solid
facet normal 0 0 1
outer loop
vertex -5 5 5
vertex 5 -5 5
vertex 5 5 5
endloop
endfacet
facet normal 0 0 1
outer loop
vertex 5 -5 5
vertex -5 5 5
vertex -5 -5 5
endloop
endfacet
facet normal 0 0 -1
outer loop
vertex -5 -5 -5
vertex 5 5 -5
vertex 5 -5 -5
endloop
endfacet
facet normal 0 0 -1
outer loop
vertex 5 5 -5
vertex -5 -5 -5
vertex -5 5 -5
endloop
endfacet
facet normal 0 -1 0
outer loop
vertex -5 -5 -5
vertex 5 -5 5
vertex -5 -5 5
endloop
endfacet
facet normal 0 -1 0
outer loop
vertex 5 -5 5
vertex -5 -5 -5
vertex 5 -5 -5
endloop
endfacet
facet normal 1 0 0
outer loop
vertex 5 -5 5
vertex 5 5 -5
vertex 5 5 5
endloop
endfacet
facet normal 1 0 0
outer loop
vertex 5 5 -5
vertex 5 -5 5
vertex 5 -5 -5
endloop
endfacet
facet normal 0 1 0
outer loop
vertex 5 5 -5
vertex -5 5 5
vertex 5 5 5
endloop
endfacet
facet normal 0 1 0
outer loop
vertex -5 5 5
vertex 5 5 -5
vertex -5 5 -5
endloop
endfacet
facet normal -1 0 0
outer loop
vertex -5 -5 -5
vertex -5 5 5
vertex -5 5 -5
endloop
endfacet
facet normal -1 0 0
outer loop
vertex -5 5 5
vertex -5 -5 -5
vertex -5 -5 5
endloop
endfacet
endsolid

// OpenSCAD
box_l = 10;	// Length
box_w = 10;	// Width
box_h = 10;	// Height

// First we have a box
cube([box_l, box_w, box_h], center = true);
